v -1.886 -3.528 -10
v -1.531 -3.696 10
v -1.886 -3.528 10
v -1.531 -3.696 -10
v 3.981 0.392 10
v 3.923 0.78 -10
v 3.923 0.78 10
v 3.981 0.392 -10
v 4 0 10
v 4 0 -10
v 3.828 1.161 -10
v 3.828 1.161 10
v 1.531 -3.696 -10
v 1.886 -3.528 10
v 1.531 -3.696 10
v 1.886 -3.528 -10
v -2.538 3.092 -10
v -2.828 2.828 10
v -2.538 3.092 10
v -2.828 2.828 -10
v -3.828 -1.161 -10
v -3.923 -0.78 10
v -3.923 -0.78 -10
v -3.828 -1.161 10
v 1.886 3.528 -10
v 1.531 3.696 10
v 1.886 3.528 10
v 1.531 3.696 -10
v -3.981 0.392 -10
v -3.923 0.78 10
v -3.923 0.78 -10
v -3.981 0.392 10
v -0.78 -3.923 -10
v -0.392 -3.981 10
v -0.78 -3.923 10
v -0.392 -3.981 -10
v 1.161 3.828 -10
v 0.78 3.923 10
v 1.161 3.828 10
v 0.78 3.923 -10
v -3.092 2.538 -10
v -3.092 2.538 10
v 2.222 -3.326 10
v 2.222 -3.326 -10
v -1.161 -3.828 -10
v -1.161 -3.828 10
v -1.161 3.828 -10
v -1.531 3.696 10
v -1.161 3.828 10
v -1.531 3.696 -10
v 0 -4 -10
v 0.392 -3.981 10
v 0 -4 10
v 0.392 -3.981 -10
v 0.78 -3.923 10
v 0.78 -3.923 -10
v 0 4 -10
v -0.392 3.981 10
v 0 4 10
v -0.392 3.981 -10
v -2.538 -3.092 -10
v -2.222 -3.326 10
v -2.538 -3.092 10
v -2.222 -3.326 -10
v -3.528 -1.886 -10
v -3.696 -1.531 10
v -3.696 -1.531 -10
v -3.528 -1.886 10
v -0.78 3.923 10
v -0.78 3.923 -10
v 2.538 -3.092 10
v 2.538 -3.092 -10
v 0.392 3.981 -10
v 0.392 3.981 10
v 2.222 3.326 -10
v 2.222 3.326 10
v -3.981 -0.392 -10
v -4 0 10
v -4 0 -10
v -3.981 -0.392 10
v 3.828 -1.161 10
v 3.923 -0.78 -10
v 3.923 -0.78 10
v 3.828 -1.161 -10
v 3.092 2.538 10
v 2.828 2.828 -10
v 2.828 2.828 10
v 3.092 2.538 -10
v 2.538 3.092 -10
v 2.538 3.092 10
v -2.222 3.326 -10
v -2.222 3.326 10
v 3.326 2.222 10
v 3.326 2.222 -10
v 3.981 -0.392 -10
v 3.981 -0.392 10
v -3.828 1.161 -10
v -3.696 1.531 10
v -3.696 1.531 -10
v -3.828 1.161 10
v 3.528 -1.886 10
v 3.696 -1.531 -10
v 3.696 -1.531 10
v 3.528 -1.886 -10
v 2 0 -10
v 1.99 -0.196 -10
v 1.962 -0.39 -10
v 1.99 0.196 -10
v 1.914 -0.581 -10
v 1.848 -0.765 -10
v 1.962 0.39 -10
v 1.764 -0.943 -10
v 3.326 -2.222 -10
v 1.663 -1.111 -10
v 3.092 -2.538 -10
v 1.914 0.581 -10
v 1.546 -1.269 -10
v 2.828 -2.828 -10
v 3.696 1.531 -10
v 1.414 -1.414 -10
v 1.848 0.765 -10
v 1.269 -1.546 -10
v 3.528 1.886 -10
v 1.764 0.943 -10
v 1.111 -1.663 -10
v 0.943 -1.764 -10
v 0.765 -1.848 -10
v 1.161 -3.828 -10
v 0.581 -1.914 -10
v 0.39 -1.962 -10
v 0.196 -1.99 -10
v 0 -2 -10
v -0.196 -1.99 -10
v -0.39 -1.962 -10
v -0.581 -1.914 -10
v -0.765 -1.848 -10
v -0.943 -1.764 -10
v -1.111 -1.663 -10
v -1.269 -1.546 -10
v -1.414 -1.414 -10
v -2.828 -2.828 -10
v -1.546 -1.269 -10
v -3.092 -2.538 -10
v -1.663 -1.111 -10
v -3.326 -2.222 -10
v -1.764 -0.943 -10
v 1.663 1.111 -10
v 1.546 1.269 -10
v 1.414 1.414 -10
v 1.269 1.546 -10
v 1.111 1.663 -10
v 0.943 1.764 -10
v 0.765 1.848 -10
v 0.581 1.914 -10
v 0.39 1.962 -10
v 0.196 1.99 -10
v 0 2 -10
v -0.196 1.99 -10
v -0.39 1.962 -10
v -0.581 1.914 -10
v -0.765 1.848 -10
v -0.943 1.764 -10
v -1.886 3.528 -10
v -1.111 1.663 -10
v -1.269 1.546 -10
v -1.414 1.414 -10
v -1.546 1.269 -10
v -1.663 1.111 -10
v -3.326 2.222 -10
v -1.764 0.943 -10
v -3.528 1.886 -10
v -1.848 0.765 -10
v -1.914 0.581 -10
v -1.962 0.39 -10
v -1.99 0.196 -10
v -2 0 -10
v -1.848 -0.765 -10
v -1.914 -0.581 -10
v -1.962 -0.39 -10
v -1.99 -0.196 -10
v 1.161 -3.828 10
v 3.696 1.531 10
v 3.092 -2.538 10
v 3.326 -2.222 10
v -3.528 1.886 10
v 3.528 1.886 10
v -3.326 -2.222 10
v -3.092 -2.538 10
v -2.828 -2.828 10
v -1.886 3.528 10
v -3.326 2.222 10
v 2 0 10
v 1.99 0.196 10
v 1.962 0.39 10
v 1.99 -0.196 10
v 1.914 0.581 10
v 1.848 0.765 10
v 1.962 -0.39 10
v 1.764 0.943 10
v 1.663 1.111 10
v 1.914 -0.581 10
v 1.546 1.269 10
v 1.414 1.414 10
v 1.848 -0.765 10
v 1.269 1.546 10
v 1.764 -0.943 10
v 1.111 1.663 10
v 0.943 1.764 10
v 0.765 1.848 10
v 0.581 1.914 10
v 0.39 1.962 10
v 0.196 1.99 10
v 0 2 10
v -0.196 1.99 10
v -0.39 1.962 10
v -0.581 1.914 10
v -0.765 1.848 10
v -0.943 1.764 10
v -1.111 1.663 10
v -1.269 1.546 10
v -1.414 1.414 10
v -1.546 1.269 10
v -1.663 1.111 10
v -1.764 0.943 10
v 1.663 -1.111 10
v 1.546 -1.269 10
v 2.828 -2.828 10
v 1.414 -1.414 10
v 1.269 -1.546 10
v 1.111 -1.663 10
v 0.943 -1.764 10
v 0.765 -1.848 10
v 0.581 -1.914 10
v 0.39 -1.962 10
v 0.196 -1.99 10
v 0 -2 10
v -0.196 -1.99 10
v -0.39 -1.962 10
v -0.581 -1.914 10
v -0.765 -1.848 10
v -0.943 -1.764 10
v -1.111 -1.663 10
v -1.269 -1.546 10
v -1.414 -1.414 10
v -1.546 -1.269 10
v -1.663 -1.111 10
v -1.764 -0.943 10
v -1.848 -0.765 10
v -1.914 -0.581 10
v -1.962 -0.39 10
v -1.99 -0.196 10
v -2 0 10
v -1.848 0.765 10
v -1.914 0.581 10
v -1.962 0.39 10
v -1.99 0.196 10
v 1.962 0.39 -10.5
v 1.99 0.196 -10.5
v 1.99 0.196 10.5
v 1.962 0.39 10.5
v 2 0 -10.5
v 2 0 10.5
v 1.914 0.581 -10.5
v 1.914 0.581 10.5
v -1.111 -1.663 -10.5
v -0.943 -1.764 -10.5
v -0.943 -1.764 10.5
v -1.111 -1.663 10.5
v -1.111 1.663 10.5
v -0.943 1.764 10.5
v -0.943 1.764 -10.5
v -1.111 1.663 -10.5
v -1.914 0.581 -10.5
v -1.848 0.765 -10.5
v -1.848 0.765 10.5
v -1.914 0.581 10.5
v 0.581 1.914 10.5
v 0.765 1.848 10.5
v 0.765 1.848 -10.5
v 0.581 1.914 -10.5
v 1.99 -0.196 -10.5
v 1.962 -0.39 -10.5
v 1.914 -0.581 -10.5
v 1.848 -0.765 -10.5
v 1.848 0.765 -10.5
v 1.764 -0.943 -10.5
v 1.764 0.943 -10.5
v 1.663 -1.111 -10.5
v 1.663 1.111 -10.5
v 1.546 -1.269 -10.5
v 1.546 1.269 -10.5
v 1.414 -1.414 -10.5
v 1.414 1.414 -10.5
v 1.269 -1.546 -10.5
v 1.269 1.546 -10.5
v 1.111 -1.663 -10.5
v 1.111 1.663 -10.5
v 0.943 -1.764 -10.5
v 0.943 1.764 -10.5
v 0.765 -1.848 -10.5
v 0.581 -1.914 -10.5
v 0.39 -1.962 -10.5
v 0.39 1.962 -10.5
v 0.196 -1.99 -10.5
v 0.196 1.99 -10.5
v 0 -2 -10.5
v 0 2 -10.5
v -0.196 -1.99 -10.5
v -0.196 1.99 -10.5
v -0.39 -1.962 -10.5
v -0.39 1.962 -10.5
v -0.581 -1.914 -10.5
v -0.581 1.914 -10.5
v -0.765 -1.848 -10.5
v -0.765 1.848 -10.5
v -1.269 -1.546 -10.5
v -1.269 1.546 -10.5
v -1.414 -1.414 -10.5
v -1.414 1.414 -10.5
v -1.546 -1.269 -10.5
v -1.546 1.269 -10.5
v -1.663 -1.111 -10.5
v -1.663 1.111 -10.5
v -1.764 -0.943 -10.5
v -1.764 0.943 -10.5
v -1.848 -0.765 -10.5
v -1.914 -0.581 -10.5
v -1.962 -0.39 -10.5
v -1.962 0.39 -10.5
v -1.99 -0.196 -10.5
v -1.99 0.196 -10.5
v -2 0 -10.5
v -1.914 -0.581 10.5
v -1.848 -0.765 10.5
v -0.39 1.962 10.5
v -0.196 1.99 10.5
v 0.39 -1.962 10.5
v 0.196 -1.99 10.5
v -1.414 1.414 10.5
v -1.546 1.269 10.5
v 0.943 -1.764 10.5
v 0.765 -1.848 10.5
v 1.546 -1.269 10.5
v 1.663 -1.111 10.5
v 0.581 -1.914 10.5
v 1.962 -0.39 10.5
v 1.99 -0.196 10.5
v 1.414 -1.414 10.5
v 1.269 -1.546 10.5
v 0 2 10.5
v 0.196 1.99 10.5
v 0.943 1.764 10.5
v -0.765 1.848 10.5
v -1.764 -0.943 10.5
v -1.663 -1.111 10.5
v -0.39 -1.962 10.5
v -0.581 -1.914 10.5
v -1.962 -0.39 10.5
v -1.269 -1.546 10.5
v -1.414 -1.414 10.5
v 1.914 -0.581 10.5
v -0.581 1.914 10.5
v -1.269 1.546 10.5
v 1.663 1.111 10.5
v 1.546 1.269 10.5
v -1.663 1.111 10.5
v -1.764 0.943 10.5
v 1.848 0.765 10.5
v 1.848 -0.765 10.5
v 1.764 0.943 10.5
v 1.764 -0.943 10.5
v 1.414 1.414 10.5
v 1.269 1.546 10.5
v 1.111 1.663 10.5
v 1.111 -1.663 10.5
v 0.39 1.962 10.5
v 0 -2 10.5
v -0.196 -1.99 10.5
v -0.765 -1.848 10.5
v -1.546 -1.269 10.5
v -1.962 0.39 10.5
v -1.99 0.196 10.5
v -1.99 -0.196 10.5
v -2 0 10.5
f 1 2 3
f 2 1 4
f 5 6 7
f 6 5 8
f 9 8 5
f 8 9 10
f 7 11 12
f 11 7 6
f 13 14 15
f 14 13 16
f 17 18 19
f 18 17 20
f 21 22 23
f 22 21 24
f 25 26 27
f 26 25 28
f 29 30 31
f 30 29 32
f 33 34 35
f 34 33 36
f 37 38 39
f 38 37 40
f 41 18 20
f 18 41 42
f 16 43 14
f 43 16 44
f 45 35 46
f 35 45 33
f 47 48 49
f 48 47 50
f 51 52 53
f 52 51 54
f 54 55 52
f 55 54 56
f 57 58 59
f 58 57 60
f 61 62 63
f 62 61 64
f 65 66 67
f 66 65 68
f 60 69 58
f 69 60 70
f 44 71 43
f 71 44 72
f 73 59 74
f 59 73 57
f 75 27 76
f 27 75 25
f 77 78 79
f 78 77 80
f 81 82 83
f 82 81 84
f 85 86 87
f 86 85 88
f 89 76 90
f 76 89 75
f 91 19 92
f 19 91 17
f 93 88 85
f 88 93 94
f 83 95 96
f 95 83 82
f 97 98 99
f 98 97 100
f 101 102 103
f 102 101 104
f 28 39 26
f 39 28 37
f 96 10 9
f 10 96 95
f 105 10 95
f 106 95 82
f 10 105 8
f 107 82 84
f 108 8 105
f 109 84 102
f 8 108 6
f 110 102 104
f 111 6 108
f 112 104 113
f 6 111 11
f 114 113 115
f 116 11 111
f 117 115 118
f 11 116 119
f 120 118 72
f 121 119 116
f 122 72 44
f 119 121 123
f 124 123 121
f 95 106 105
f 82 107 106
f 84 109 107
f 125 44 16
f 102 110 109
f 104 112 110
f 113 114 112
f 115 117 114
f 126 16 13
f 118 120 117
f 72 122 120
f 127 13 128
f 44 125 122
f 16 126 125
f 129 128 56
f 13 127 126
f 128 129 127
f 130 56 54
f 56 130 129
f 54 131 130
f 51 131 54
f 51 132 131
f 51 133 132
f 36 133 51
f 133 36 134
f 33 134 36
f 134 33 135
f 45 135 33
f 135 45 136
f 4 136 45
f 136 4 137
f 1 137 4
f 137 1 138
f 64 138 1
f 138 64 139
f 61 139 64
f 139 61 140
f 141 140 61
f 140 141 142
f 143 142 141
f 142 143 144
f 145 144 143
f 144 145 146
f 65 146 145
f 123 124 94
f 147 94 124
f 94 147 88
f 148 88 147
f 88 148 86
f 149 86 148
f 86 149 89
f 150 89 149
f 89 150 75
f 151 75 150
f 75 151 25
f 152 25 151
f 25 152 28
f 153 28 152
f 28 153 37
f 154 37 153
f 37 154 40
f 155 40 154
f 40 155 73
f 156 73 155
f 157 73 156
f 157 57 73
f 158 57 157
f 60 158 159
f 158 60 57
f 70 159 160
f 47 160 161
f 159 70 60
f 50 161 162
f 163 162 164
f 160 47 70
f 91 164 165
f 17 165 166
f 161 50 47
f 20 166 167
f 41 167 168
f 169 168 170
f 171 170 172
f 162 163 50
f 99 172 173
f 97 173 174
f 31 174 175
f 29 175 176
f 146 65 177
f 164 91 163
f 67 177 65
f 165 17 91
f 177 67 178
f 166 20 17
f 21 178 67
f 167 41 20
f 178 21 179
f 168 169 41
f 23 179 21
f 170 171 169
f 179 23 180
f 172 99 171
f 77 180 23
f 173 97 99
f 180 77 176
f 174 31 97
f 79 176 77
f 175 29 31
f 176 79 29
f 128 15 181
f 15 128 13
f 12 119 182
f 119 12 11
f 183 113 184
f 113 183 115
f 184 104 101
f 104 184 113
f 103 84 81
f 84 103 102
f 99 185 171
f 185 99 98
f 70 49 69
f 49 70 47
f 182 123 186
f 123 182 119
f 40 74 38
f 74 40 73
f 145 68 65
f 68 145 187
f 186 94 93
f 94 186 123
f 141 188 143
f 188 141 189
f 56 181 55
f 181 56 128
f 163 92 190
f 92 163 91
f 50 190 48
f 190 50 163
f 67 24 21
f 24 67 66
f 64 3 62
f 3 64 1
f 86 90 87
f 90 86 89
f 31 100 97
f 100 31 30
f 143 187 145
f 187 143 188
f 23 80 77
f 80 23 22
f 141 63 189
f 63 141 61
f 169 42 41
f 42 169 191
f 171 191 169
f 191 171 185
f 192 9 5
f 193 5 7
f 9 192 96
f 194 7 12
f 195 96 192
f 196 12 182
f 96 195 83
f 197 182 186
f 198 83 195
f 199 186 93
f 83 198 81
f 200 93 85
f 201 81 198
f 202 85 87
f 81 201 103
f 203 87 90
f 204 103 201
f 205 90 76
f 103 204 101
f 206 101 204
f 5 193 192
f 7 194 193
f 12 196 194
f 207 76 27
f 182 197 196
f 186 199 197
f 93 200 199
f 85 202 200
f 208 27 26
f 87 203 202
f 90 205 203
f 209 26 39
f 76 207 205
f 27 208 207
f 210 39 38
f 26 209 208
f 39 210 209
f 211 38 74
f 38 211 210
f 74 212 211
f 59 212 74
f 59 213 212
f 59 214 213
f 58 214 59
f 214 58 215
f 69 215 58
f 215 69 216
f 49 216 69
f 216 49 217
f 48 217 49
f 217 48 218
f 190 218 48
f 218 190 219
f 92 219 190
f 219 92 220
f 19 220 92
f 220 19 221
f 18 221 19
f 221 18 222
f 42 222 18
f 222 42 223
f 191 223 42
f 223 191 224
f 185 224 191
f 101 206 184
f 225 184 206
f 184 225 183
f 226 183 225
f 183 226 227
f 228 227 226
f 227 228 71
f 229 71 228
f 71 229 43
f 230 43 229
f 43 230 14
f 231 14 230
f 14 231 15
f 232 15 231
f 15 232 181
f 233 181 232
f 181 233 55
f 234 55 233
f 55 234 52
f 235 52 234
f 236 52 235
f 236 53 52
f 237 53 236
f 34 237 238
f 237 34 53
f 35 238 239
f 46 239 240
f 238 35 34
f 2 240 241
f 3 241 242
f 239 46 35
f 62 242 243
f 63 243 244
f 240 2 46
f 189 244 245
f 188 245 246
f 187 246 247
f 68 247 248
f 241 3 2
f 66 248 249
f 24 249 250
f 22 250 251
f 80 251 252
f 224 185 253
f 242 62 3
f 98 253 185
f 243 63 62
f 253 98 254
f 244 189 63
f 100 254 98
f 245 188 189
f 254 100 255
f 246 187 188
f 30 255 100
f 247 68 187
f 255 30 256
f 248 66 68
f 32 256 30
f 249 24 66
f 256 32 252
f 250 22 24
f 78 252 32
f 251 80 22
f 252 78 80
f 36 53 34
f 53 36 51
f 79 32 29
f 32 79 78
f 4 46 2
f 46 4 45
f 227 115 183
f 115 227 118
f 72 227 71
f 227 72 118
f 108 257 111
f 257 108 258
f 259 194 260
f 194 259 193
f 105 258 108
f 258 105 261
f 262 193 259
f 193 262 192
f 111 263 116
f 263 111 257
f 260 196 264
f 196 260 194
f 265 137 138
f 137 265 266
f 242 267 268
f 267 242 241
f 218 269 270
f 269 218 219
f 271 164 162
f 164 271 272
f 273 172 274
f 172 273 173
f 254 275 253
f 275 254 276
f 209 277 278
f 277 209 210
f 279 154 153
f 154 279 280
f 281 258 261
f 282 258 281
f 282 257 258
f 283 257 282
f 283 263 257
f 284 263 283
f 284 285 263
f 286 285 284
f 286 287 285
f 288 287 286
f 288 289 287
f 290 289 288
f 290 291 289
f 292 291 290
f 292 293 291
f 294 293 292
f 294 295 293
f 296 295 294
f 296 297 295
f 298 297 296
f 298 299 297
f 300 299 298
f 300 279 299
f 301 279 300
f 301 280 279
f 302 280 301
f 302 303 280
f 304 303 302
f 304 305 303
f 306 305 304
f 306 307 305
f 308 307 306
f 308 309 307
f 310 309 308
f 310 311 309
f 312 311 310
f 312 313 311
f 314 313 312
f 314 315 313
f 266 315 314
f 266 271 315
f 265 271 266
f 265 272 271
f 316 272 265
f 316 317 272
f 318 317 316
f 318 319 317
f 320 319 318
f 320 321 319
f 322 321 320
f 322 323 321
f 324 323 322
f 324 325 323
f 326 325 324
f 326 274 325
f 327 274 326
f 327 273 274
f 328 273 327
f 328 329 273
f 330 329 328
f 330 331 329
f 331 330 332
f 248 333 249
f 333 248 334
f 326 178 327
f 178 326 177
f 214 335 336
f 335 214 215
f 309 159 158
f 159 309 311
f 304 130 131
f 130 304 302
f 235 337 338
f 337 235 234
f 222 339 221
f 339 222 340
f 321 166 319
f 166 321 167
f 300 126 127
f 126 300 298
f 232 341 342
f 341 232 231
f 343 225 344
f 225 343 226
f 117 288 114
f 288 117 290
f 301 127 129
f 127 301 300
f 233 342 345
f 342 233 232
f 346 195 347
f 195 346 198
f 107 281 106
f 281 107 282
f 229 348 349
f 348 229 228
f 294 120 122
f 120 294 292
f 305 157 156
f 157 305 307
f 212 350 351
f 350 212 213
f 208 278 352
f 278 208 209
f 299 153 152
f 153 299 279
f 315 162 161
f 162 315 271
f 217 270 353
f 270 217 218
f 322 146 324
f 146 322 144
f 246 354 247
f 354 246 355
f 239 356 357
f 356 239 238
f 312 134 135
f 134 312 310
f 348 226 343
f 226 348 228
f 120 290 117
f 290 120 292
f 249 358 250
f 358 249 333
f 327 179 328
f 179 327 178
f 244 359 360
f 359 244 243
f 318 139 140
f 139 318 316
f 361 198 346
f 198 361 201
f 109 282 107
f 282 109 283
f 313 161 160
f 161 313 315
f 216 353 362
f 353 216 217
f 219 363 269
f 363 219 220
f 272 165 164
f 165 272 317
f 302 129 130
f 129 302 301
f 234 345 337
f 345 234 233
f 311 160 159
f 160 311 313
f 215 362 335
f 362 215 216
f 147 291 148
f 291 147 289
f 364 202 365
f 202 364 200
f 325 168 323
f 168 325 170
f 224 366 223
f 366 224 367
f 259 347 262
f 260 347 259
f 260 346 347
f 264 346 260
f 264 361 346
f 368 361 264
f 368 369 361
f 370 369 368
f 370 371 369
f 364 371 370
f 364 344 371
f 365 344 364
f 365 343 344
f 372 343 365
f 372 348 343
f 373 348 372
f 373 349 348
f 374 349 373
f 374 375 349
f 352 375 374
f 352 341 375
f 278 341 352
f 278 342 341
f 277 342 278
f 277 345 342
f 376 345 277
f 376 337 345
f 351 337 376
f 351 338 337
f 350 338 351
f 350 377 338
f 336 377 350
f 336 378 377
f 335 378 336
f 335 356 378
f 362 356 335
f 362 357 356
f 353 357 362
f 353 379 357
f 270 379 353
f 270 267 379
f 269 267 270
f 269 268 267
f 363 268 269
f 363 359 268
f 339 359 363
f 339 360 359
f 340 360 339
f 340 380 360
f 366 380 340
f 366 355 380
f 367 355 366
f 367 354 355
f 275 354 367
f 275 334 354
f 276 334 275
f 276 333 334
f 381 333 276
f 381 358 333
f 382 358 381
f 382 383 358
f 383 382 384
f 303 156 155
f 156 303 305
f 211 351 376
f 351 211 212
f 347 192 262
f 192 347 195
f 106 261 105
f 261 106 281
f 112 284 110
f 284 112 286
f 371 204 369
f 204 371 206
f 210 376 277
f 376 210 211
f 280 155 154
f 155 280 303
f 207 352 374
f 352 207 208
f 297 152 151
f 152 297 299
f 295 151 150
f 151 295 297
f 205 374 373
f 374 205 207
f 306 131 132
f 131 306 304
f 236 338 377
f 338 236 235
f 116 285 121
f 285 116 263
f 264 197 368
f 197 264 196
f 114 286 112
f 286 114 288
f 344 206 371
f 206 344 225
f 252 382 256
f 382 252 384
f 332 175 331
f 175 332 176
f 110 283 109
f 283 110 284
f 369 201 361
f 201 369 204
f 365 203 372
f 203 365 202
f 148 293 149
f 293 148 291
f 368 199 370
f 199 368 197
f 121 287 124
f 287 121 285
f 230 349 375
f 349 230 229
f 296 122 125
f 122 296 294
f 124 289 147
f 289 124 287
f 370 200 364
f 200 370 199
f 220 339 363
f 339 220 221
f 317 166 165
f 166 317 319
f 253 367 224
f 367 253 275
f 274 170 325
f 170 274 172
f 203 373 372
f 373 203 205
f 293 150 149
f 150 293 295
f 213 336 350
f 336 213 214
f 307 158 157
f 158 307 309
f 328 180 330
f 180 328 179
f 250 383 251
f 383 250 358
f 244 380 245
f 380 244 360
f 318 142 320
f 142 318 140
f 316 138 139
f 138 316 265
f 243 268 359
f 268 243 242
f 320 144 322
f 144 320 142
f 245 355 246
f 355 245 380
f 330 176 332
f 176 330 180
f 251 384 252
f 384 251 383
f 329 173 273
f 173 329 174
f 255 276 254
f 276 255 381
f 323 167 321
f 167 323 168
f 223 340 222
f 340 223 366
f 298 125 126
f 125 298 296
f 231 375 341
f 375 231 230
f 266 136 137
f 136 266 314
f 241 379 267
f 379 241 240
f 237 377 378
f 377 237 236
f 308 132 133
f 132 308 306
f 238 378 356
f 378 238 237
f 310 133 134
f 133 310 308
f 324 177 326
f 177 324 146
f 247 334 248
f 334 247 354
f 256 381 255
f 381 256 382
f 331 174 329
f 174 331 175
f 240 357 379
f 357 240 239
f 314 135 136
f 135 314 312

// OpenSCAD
// Parameters
overall_length_mm = 20; //[10:40:1]
outer_diameter_mm = 8; //[4:16:0.5]
thread_diameter_mm = 4; //[2:8:0.25]
thread_length_mm = 20; //[5:40:1]
overlap_mm = 1; //[0.5:2:0.1]

// Standoff - complete geometry
module standoff() {
  color("Silver") {
    // Main body
    cylinder(h=overall_length_mm, r=outer_diameter_mm/2, center=true, $fn=64);
  }
}

// Pillar - complete geometry
module pillar() {
  color("DimGray") {
    // Threaded feature
    cylinder(h=thread_length_mm + overlap_mm, r=thread_diameter_mm/2, center=true, $fn=64);
  }
}

// Assembly
module assembly() {
  union() {
    standoff();
    pillar();
  }
}

assembly();
